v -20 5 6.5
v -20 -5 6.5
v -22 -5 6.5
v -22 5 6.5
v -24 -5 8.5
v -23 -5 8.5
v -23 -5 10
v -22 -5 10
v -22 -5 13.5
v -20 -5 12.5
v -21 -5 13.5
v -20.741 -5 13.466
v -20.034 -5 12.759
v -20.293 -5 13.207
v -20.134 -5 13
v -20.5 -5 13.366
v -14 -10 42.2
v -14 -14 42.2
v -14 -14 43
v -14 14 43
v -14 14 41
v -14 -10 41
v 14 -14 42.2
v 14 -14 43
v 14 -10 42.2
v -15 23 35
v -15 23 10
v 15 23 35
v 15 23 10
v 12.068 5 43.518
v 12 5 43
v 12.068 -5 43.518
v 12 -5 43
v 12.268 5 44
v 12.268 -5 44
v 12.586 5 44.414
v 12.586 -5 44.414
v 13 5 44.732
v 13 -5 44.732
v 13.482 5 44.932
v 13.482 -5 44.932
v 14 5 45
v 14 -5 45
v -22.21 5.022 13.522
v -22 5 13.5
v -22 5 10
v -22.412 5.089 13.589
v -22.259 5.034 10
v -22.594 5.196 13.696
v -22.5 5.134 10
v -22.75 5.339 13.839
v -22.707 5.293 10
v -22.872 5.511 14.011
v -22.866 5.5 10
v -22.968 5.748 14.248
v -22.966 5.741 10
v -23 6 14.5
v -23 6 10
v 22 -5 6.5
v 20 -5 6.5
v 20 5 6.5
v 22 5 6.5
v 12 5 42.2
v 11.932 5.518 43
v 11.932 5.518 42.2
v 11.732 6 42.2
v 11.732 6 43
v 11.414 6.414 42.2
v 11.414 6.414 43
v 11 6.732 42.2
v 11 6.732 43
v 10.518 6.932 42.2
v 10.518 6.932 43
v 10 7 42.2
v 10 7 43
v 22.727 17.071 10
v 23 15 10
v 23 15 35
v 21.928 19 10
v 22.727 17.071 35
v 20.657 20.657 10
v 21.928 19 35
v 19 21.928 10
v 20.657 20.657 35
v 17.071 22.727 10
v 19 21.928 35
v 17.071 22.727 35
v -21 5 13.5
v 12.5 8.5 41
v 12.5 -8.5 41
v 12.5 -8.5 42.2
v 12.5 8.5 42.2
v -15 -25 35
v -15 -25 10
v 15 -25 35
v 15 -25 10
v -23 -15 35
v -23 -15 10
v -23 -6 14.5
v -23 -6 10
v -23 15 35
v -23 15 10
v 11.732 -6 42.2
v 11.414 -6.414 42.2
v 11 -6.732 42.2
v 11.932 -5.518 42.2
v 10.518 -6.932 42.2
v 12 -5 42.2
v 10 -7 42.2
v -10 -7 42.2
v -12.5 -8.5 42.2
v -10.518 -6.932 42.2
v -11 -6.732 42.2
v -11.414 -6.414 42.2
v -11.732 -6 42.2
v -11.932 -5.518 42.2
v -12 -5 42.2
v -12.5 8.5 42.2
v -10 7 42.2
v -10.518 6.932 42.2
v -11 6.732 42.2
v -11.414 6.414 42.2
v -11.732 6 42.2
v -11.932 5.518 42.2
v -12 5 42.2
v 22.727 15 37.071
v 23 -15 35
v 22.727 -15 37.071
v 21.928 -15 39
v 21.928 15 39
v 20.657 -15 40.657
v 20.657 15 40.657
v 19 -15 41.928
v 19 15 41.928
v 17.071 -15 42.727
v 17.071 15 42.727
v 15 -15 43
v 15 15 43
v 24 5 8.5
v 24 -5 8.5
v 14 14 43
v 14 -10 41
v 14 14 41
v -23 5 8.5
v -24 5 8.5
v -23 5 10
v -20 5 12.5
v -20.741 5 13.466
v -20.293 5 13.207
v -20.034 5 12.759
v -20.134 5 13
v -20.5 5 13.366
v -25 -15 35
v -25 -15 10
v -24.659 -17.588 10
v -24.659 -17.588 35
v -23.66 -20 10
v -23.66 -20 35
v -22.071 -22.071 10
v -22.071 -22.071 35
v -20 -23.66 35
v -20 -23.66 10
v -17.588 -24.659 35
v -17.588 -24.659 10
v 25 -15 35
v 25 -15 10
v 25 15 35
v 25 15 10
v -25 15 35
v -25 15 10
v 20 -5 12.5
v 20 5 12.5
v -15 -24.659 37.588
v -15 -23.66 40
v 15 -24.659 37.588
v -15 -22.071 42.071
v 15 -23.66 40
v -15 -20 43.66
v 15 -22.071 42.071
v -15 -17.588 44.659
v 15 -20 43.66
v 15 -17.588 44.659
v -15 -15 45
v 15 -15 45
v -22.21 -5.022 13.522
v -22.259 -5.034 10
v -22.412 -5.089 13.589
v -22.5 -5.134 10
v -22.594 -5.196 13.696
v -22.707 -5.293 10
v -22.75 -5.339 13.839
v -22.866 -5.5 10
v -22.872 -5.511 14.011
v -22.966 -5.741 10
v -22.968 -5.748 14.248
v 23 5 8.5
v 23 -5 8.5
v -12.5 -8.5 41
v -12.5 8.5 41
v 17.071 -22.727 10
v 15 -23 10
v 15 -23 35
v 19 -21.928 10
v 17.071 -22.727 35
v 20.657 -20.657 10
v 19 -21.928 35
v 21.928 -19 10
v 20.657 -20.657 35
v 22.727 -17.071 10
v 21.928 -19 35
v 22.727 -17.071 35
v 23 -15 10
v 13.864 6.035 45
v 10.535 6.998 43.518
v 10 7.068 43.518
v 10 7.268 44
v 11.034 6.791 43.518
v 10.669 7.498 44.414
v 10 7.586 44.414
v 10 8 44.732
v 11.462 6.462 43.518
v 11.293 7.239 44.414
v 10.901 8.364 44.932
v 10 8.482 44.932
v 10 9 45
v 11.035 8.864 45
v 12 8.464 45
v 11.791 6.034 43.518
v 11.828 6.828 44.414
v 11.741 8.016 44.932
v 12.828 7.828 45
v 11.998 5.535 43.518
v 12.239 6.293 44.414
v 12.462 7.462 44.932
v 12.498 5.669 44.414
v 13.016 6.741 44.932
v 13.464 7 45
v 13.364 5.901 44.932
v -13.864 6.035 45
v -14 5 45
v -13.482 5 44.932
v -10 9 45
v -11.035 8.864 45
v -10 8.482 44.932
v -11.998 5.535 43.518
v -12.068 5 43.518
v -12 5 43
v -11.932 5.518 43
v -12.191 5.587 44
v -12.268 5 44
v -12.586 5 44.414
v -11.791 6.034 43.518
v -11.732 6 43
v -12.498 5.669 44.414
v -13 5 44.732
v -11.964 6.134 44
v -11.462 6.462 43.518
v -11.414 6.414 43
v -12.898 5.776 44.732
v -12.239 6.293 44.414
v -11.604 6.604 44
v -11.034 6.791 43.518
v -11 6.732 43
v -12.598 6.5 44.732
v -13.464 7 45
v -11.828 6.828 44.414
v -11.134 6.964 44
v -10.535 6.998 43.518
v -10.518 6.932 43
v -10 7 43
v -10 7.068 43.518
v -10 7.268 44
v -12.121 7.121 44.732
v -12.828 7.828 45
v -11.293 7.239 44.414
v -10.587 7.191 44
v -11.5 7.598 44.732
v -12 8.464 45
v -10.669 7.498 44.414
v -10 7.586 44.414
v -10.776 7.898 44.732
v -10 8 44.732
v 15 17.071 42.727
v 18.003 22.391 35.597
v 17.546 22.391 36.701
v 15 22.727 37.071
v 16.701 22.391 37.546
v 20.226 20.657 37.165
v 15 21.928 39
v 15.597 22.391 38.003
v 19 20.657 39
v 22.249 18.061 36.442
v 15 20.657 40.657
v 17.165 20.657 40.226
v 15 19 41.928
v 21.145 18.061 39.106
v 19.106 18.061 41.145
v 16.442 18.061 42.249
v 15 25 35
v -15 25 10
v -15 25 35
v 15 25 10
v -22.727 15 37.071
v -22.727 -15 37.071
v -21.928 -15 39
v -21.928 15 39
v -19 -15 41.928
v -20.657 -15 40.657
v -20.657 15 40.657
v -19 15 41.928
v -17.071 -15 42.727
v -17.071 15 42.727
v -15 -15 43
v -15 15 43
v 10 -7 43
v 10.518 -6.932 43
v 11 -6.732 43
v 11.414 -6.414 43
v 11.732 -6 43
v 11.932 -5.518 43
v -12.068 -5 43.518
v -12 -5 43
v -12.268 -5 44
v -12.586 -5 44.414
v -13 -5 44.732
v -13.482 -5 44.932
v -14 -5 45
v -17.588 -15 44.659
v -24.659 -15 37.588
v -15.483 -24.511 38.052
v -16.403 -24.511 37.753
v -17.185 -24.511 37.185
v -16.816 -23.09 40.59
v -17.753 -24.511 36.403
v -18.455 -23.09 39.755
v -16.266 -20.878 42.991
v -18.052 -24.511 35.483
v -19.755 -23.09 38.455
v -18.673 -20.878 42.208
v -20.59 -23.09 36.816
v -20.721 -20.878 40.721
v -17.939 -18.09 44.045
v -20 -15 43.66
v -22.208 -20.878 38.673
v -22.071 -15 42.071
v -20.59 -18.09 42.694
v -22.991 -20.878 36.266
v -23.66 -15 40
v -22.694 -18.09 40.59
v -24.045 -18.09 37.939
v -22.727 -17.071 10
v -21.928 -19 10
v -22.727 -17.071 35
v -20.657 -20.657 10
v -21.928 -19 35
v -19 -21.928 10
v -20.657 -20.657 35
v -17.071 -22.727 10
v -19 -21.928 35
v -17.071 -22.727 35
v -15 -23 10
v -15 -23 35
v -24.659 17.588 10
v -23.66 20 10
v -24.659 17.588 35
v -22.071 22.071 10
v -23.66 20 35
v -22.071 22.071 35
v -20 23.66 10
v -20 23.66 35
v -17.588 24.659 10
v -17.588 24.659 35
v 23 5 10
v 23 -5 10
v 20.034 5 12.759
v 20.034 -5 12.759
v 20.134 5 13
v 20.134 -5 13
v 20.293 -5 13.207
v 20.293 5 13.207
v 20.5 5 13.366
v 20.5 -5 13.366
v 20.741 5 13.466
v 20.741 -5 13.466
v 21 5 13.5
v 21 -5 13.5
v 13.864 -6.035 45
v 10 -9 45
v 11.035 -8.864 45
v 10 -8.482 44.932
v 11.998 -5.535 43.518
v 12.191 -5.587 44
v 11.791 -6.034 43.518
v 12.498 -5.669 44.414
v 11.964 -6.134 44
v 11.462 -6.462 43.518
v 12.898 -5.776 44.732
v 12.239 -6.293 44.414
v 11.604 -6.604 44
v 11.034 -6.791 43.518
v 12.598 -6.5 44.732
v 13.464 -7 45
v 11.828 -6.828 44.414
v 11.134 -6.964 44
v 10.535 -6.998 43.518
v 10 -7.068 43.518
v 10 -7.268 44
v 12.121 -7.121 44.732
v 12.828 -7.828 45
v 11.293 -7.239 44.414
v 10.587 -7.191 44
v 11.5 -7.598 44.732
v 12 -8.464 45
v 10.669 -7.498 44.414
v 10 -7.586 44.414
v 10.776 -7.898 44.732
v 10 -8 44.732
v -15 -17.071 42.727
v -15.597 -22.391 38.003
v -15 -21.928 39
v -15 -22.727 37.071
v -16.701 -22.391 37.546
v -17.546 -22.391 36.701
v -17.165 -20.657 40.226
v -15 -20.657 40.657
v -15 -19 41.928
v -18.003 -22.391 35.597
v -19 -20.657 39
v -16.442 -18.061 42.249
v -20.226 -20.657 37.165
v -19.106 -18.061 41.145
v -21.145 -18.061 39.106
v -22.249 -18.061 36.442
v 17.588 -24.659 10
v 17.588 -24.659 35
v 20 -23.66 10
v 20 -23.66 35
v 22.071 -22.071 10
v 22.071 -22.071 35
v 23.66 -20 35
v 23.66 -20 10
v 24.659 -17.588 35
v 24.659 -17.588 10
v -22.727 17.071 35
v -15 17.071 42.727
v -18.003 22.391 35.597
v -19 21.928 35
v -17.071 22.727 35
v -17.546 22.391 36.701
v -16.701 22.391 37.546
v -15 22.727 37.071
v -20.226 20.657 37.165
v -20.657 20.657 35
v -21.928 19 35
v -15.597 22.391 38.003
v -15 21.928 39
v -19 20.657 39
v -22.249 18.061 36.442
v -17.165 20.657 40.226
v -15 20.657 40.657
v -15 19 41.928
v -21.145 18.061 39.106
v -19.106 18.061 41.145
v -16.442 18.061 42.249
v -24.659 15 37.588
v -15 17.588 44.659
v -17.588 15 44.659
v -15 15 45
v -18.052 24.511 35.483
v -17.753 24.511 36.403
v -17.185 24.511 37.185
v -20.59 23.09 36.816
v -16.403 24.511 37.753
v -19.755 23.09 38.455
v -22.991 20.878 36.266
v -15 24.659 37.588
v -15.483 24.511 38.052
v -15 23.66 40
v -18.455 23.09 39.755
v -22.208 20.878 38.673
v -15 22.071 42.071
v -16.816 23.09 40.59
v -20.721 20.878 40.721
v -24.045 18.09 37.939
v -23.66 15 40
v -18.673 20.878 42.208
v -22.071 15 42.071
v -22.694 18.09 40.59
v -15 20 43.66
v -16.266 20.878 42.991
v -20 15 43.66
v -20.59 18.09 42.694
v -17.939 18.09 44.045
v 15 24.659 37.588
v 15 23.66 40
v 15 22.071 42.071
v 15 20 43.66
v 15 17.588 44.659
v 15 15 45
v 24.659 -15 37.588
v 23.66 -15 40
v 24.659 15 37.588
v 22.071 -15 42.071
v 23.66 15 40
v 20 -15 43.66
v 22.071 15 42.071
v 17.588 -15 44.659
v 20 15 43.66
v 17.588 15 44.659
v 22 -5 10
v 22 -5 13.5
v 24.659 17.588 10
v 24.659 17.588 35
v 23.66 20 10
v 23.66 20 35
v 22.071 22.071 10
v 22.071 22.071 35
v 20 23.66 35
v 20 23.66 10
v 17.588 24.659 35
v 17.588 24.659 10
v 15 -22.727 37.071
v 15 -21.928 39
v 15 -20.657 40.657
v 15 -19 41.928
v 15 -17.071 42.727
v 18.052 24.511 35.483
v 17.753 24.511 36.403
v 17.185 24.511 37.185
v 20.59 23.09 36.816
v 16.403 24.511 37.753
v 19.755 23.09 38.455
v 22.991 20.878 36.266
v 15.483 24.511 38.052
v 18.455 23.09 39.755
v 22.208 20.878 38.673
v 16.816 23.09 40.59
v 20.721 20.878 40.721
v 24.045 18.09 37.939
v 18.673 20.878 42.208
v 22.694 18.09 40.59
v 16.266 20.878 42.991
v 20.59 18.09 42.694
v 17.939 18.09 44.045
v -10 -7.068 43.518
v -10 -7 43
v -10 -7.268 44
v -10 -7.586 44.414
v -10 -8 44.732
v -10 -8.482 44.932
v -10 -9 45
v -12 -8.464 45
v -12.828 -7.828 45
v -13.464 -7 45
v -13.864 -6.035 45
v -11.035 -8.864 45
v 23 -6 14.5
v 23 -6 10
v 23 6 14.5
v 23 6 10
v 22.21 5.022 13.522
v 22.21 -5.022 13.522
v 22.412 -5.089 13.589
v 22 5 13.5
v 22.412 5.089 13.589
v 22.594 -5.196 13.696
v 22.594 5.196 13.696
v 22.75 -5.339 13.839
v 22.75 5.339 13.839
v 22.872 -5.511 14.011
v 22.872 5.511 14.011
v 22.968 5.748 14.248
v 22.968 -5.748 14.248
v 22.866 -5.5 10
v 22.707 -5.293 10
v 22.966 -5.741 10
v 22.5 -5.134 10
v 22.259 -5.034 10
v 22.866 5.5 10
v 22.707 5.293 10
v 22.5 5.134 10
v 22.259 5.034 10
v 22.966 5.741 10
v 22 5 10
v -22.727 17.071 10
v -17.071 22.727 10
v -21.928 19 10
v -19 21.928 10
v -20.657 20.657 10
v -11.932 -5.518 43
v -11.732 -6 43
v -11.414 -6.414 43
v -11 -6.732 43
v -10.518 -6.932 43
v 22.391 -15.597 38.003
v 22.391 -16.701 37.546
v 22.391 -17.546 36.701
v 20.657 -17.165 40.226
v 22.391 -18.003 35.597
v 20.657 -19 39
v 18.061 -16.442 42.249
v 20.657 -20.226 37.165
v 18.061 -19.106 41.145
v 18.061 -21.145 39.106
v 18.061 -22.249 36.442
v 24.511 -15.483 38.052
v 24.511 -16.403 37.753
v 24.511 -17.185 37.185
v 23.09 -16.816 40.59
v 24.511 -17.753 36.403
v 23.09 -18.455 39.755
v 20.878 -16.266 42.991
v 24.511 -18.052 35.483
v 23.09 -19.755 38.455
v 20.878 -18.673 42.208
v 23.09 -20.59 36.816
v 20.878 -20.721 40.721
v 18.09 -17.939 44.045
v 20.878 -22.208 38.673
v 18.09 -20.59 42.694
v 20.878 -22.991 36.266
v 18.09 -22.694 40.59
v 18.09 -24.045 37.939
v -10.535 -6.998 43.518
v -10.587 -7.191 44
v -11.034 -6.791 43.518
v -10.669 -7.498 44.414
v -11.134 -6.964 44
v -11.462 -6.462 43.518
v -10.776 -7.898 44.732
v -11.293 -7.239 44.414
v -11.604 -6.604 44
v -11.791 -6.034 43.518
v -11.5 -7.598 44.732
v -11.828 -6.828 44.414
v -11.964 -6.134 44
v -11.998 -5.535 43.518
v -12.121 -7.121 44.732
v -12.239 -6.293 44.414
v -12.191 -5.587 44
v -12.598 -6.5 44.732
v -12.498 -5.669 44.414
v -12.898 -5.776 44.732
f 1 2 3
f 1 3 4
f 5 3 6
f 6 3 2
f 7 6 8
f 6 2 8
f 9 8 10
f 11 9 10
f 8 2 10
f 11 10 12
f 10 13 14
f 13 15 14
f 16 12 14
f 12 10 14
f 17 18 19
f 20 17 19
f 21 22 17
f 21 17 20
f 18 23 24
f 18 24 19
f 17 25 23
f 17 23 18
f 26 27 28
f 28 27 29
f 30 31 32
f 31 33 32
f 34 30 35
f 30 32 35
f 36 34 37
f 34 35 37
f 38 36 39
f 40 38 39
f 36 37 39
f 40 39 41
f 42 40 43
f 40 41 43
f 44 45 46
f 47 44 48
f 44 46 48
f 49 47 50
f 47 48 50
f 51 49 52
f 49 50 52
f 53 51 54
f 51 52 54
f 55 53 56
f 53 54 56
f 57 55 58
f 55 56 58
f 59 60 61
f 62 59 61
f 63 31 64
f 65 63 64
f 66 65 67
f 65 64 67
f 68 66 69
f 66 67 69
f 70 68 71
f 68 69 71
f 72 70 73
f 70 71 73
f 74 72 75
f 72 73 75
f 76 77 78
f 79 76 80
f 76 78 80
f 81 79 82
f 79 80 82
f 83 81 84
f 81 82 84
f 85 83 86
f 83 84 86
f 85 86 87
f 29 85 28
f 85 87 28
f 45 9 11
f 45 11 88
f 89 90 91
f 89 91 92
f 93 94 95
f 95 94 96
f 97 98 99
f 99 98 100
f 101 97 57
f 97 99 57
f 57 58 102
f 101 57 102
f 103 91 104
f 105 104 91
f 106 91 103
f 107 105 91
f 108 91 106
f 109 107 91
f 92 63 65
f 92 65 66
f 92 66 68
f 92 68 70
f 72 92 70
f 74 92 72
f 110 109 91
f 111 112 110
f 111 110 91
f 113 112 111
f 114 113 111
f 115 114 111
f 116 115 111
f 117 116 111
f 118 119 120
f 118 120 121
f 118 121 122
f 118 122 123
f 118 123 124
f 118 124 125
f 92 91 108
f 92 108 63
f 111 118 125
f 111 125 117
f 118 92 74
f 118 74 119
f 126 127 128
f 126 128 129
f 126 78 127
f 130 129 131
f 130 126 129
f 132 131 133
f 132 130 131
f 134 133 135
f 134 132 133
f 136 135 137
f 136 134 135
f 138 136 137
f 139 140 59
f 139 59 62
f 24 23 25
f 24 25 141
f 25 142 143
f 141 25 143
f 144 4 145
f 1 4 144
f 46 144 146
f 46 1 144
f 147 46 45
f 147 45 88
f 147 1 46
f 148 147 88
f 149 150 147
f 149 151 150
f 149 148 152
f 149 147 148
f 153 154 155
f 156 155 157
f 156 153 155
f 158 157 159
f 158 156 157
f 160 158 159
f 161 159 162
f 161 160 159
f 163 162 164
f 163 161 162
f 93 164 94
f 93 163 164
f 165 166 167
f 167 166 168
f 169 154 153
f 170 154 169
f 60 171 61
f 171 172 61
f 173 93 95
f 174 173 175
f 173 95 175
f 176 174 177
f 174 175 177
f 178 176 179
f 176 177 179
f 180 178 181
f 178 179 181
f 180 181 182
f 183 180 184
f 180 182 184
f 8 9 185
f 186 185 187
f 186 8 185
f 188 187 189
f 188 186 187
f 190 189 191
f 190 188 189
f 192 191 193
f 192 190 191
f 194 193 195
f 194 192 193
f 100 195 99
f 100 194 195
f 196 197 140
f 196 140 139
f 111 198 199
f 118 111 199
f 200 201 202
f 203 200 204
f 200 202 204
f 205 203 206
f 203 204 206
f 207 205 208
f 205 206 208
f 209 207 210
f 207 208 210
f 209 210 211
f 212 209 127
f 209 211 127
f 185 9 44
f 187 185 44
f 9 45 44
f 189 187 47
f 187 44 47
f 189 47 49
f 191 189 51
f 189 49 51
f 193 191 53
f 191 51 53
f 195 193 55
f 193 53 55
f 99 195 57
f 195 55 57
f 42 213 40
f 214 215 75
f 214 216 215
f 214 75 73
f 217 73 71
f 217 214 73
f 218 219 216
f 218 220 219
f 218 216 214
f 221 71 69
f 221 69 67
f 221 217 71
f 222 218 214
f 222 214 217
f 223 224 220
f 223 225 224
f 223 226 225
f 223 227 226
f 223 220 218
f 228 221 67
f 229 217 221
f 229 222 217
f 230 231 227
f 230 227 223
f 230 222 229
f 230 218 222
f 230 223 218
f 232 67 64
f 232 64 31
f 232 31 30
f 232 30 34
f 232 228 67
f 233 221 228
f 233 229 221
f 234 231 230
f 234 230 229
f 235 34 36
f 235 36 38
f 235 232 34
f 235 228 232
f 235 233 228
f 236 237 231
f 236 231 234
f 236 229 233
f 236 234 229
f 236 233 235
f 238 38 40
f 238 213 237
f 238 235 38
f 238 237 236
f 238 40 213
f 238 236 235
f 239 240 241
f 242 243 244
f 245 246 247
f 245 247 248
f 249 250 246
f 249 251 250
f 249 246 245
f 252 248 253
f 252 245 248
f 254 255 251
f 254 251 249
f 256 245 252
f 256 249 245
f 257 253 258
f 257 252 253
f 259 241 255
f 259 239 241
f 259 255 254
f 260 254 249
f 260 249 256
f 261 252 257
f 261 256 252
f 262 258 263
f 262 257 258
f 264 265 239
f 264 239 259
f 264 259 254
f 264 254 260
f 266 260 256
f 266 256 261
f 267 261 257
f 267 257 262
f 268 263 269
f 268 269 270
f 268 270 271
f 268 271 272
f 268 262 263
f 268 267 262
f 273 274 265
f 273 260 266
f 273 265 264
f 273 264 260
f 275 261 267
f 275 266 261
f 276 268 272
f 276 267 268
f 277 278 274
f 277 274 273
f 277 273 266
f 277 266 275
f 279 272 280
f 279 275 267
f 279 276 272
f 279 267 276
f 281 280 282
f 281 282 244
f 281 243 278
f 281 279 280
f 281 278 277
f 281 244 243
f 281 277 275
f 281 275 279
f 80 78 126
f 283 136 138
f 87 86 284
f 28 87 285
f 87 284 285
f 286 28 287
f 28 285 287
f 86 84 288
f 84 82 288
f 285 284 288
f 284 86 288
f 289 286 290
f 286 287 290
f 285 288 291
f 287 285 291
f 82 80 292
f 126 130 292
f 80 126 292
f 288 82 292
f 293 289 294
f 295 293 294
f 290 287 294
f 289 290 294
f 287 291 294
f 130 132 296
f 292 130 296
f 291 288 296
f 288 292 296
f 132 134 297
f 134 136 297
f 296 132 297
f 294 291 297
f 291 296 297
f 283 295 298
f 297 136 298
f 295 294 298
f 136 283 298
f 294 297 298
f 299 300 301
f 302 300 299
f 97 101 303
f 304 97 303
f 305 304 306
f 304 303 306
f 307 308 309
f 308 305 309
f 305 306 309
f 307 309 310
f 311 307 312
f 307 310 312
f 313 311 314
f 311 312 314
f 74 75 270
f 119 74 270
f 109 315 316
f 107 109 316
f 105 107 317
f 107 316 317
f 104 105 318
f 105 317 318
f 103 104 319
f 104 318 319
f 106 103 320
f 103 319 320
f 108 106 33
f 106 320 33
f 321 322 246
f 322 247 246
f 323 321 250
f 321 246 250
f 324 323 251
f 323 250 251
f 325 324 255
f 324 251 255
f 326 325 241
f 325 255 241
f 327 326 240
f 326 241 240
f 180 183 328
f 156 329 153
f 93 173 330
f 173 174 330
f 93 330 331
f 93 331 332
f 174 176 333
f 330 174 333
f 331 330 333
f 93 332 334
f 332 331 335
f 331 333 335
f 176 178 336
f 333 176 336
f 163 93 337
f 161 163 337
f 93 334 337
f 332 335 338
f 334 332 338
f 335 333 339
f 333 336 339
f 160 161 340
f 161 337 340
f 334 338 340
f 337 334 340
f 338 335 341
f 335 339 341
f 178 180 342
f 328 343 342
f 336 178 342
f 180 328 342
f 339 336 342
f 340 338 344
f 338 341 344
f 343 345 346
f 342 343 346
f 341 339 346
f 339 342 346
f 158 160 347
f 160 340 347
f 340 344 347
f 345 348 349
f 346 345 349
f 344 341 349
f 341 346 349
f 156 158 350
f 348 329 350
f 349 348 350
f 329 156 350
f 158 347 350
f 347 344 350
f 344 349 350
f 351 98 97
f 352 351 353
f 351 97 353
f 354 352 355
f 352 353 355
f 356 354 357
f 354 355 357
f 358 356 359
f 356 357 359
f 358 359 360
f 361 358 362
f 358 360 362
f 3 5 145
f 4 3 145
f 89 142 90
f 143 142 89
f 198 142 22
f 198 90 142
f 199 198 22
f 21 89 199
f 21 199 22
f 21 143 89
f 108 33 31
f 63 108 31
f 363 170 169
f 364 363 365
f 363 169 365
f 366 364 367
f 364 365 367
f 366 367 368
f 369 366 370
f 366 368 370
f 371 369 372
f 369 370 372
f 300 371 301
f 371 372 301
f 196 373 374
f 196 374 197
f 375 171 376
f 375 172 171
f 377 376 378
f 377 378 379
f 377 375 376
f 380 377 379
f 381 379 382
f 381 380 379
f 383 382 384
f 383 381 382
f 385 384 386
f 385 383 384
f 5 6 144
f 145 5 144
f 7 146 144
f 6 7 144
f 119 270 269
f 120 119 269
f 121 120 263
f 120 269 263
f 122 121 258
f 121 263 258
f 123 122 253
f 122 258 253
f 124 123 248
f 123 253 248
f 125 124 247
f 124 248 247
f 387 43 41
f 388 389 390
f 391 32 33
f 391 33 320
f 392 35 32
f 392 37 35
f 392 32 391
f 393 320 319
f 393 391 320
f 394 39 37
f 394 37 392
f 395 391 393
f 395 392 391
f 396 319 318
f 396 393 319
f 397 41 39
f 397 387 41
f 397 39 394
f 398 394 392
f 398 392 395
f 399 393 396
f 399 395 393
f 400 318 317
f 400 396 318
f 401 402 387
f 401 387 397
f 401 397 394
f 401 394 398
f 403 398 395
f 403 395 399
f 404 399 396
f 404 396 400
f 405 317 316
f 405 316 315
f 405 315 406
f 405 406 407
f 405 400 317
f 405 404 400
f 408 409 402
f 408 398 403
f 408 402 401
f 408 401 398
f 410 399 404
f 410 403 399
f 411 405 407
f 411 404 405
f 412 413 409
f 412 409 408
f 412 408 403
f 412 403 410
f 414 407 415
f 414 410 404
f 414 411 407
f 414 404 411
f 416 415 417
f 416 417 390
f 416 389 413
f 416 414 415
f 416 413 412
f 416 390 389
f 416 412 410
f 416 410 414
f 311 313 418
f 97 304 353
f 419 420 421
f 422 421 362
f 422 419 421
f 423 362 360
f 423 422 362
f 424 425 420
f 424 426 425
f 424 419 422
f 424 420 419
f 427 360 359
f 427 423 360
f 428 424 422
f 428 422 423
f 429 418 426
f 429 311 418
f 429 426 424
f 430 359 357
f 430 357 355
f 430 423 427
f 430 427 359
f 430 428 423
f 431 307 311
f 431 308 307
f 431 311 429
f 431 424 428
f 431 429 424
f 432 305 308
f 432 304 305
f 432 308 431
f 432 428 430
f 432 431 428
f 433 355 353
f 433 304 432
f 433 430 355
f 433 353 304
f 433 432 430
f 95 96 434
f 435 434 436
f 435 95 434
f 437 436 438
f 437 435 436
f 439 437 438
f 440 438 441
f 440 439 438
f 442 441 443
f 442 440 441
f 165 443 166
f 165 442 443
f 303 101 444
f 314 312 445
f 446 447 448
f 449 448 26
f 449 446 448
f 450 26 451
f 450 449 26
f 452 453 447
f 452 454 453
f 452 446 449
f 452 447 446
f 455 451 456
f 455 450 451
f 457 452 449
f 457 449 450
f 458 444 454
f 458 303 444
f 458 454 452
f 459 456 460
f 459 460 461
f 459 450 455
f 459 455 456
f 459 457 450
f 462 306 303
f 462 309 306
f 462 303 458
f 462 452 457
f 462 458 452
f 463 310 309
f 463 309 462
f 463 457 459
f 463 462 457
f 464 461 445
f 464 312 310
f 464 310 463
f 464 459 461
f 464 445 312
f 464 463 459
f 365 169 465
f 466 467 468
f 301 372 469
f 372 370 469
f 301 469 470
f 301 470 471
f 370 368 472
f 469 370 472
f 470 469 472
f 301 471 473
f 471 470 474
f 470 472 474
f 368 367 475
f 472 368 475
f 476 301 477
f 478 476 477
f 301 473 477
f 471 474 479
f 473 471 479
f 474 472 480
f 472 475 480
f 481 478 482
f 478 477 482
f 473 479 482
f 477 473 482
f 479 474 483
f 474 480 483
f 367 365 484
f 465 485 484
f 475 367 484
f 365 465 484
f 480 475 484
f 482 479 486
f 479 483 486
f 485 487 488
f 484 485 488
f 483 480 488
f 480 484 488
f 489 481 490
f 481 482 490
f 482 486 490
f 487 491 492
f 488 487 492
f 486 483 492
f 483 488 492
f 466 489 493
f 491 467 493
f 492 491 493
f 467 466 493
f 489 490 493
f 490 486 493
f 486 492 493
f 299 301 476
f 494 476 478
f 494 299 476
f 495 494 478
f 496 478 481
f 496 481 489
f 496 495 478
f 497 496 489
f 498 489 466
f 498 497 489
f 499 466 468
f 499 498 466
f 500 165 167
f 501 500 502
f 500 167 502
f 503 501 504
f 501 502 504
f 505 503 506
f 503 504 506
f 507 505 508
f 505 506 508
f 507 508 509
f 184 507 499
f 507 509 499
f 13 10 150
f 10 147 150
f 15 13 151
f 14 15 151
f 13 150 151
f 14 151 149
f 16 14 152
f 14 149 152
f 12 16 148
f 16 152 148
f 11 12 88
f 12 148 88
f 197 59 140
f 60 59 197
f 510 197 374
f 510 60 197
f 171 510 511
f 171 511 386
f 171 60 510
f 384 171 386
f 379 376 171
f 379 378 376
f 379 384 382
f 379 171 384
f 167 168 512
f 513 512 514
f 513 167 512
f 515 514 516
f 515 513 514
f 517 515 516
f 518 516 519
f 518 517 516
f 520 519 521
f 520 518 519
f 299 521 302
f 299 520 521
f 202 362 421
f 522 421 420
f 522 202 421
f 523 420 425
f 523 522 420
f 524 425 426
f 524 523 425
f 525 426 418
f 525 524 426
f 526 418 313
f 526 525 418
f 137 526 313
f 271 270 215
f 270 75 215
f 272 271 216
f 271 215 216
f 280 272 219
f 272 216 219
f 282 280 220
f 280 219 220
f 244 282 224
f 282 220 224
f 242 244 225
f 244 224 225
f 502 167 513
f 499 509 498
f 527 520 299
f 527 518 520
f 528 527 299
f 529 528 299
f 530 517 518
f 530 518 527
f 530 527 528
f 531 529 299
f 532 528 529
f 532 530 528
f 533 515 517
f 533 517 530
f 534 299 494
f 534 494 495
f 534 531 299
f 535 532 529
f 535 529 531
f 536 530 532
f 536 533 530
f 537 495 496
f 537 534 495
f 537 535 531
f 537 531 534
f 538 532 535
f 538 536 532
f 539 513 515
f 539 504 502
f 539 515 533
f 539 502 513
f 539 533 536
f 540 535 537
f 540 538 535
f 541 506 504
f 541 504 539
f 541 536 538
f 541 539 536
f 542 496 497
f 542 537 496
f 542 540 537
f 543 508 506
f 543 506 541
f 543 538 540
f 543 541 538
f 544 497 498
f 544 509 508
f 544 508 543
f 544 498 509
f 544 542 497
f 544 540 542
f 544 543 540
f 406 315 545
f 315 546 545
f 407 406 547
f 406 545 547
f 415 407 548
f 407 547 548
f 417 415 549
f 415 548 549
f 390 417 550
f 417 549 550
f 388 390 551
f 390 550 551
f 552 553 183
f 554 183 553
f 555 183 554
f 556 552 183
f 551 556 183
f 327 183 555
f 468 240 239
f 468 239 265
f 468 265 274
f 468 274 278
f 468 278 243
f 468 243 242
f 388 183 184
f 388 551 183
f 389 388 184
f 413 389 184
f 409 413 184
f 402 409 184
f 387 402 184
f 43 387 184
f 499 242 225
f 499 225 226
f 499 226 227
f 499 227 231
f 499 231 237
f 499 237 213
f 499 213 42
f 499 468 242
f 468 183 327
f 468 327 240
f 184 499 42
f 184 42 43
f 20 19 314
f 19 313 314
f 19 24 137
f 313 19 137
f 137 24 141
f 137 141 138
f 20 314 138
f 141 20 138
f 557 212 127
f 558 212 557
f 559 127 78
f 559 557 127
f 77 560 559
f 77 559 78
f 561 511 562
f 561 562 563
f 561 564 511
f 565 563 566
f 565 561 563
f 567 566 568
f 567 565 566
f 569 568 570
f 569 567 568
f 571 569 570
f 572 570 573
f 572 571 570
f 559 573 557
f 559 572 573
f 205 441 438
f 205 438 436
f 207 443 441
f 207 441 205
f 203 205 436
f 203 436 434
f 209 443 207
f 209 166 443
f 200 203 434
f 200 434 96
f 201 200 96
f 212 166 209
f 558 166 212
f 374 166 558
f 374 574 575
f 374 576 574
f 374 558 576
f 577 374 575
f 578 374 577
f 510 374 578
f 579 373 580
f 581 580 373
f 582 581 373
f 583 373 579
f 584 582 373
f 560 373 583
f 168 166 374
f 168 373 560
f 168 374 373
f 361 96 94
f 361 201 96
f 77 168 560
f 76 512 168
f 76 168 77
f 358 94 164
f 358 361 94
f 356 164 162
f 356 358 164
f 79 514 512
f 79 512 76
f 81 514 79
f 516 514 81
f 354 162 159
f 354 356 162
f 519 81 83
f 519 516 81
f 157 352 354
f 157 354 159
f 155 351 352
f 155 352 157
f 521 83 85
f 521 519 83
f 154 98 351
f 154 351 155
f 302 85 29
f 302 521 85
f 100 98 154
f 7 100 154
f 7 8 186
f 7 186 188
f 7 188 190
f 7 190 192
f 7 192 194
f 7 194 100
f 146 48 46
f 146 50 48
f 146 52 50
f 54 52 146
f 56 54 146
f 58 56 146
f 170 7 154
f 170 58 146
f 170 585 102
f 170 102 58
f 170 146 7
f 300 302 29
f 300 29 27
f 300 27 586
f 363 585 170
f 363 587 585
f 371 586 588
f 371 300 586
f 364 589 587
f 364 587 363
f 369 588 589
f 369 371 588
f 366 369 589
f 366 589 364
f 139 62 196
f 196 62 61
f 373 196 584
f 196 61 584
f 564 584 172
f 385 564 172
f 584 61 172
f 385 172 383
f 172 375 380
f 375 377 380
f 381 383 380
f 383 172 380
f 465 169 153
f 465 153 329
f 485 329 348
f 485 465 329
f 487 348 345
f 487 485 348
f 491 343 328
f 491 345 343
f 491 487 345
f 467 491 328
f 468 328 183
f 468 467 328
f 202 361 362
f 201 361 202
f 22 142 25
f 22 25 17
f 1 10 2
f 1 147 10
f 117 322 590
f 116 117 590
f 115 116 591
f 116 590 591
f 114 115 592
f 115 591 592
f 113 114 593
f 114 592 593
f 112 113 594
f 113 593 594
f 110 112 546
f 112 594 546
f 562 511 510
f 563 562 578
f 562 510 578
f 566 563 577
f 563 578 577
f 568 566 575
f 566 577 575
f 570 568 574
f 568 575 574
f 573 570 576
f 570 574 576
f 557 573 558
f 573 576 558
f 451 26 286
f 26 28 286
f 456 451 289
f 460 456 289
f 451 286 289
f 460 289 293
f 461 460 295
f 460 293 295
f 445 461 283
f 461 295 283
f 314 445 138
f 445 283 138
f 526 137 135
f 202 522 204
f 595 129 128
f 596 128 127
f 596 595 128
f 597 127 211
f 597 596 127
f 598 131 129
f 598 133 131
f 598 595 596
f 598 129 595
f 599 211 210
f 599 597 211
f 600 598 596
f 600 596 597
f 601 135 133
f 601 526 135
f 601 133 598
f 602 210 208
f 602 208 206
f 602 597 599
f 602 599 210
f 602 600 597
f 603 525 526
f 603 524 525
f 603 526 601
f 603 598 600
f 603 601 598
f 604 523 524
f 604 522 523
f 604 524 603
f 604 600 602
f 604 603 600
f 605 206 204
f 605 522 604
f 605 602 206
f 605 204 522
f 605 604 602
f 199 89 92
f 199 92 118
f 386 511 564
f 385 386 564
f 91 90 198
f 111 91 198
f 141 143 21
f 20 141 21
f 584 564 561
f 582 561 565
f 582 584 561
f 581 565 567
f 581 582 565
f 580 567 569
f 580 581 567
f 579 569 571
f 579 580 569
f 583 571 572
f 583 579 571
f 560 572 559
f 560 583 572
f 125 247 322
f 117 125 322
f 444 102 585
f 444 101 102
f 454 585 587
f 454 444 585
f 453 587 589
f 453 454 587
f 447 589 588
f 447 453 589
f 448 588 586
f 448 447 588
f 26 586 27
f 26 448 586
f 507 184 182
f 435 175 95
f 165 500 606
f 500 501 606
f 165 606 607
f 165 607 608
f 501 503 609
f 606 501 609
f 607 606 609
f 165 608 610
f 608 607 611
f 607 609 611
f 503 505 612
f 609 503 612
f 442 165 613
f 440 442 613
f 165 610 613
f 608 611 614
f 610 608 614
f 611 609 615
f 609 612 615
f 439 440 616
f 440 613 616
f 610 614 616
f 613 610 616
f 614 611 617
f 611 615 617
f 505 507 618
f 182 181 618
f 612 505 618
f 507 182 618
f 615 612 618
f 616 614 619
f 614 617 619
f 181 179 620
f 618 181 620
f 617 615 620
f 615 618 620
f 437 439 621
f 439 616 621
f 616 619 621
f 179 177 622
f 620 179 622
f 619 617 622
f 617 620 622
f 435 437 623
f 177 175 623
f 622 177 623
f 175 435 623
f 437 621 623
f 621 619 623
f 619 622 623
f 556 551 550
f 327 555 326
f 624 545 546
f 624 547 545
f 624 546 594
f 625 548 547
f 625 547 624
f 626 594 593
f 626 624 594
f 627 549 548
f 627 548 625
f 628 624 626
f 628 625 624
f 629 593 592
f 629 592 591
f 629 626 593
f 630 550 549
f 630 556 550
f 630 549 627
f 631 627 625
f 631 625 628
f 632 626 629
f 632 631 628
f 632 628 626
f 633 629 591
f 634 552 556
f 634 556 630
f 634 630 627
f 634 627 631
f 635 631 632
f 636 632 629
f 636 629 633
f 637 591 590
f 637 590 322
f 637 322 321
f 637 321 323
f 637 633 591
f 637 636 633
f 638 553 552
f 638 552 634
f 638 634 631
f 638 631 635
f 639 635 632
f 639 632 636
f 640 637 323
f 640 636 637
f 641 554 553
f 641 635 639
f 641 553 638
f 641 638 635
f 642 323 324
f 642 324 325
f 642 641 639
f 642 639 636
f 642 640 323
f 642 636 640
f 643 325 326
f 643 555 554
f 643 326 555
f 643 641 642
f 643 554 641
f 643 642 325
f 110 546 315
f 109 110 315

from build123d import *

# Parameters (mm, degrees)
SKETCH1_W                = 50
SKETCH1_H                = 50
BOSS_EXTRUDE1_DEPTH      = 45
FILLET1_R                = 10
SHELL1_T                 = -2
SKETCH2_W                = 24
SKETCH2_H                = 14
CUT_EXTRUDE1_DEPTH       = 10
SKETCH3_W                = 28
SKETCH3_H                = 18
BOSS_EXTRUDE2_DEPTH      = 2
SKETCH4_W                = 24
SKETCH4_H                = 14
CUT_EXTRUDE2_DEPTH       = 2
FILLET2_R                = 2
FILLET3_R                = 2
SKETCH5_W                = 28
SKETCH5_H                = 28
BOSS_EXTRUDE3_DEPTH      = 2
CUT_EXTRUDE4_DEPTH       = 2
SKETCH8_W                = 25
SKETCH8_H                = 17
CUT_EXTRUDE5_DEPTH       = 1.2
SKETCH9_W                = 28
SKETCH9_H                = 4
CUT_EXTRUDE6_DEPTH       = 1.2
CUT_EXTRUDE10_START      = -10
CUT_EXTRUDE10_DEPTH      = 10
SKETCH14_W               = 7
SKETCH14_H               = 10
BOSS_EXTRUDE4_DEPTH      = 3
SKETCH15_W               = 2
SKETCH15_H               = 10
BOSS_EXTRUDE5_DEPTH      = 1
CHAMFER1_SIZE            = 2
FILLET4_R                = 1
CHAMFER1_OF_MIRROR1_SIZE = 2
FILLET5_R                = 1


with BuildPart() as part:
    # Sketch1 → Boss-Extrude1 (new body)
    with BuildSketch(Plane.XY):
        Rectangle(SKETCH1_W, SKETCH1_H)
    extrude(amount=BOSS_EXTRUDE1_DEPTH)

    # Fillet1
    fillet1_edges = [part.edges().sort_by_distance(p)[0] for p in [
        (-25, 0, 45),
        (0, -25, 45),
        (25, 0, 45),
        (25, -25, 22.5),
        (-25, -25, 22.5),
        (-25, 25, 22.5),
        (25, 25, 22.5),
        (0, 25, 45),
    ]]
    fillet(fillet1_edges, radius=FILLET1_R)

    # Shell1
    shell1_openings = [part.faces().sort_by_distance(p)[0] for p in [
        (0, 0, 0),
    ]]
    offset(amount=SHELL1_T, openings=shell1_openings, kind=Kind.INTERSECTION)

    # Sketch2 → Cut-Extrude1 (cut)
    with BuildSketch(Plane(origin=(0, 0, 43), x_dir=(-1, 0, 0), z_dir=(0, 0, -1))):
        Rectangle(SKETCH2_W, SKETCH2_H)
    extrude(amount=-CUT_EXTRUDE1_DEPTH, mode=Mode.SUBTRACT)

    # Sketch3 → Boss-Extrude2 (add)
    with BuildSketch(Plane(origin=(0, 0, 43), x_dir=(-1, 0, 0), z_dir=(0, 0, -1))):
        Rectangle(SKETCH3_W, SKETCH3_H)
    extrude(amount=BOSS_EXTRUDE2_DEPTH)

    # Sketch4 → Cut-Extrude2 (cut)
    with BuildSketch(Plane.XY.offset(43)):
        Rectangle(SKETCH4_W, SKETCH4_H)
    extrude(amount=-CUT_EXTRUDE2_DEPTH, mode=Mode.SUBTRACT)

    # Fillet2
    fillet2_edges = [part.edges().sort_by_distance(p)[0] for p in [
        (-12, 7, 43),
        (-12, -7, 43),
        (12, -7, 43),
        (12, 7, 43),
    ]]
    fillet(fillet2_edges, radius=FILLET2_R)

    # Fillet3
    fillet3_edges = [part.edges().sort_by_distance(p)[0] for p in [
        (12, 0, 45),
        (0, 7, 45),
        (0, -7, 45),
        (-12, 0, 45),
        (11.414213562, 6.414213562, 45),
        (11.414213562, -6.414213562, 45),
        (-11.414213562, -6.414213562, 45),
        (-11.414213562, 6.414213562, 45),
    ]]
    fillet(fillet3_edges, radius=FILLET3_R)

    # Sketch5 → Boss-Extrude3 (add)
    with BuildSketch(Plane(origin=(0, 0, 41), x_dir=(-1, 0, 0), z_dir=(0, 0, -1))):
        Rectangle(SKETCH5_W, SKETCH5_H)
    extrude(amount=-BOSS_EXTRUDE3_DEPTH)

    # Sketch7 → Cut-Extrude4 (cut)
    with BuildSketch(Plane.XY.offset(43)):
        with BuildLine():
            Line((12, -5), (12, 5))
            ThreePointArc((12, 5), (11.414213562, 6.414213562), (10, 7))
            Line((10, 7), (-10, 7))
            ThreePointArc((-10, 7), (-11.414213562, 6.414213562), (-12, 5))
            Line((-12, 5), (-12, -5))
            ThreePointArc((-12, -5), (-11.414213562, -6.414213562), (-10, -7))
            Line((-10, -7), (10, -7))
            ThreePointArc((10, -7), (11.414213562, -6.414213562), (12, -5))
        make_face()
    extrude(amount=-CUT_EXTRUDE4_DEPTH, mode=Mode.SUBTRACT)

    # Sketch8 → Cut-Extrude5 (cut)
    with BuildSketch(Plane(origin=(0, 0, 41), x_dir=(-1, 0, 0), z_dir=(0, 0, -1))):
        Rectangle(SKETCH8_W, SKETCH8_H)
    extrude(amount=-CUT_EXTRUDE5_DEPTH, mode=Mode.SUBTRACT)

    # Sketch9 → Cut-Extrude6 (cut)
    with BuildSketch(Plane(origin=(0, 0, 41), x_dir=(-1, 0, 0), z_dir=(0, 0, -1))):
        with Locations((0, -12)):
            Rectangle(SKETCH9_W, SKETCH9_H)
    extrude(amount=-CUT_EXTRUDE6_DEPTH, mode=Mode.SUBTRACT)

    # Sketch13 → Cut-Extrude10 (cut)
    with BuildSketch(Plane(origin=(0, 0, 0), x_dir=(-1, 0, 0), z_dir=(0, 0, -1)).offset(CUT_EXTRUDE10_START)):
        with BuildLine():
            Line((-15, -25), (15, -25))
            ThreePointArc((15, -25), (22.071067812, -22.071067812), (25, -15))
            Line((25, -15), (25, 15))
            ThreePointArc((25, 15), (22.071067812, 22.071067812), (15, 25))
            Line((15, 25), (-15, 25))
            ThreePointArc((-15, 25), (-22.071067812, 22.071067812), (-25, 15))
            Line((-25, 15), (-25, -15))
            ThreePointArc((-25, -15), (-22.071067812, -22.071067812), (-15, -25))
        make_face()
    extrude(amount=CUT_EXTRUDE10_DEPTH, mode=Mode.SUBTRACT)

    # Sketch14 → Boss-Extrude4 (add)
    with BuildSketch(Plane(origin=(-23, 0, 0), x_dir=(0, 0, -1), z_dir=(1, 0, 0))):
        with Locations((-10, 0)):
            Rectangle(SKETCH14_W, SKETCH14_H)
    boss_extrude4 = extrude(amount=BOSS_EXTRUDE4_DEPTH)

    # Sketch15 → Boss-Extrude5 (add)
    with BuildSketch(Plane.ZY.offset(23)):
        with Locations((7.5, 0)):
            Rectangle(SKETCH15_W, SKETCH15_H)
    boss_extrude5 = extrude(amount=BOSS_EXTRUDE5_DEPTH)

    # Chamfer1
    chamfer1_edges = [part.edges().sort_by_distance(p)[0] for p in [
        (-24, 0, 6.5),
    ]]
    chamfer(chamfer1_edges, length=CHAMFER1_SIZE - 0.0001)  # a hair under: the kernel refuses the full size

    # Fillet4
    fillet4_edges = [part.edges().sort_by_distance(p)[0] for p in [
        (-23, 5, 11.75),
        (-23, 0, 13.5),
        (-23, -5, 11.75),
        (-20, 0, 13.5),
    ]]
    fillet(fillet4_edges, radius=FILLET4_R)

    # Mirror1: Boss-Extrude4, Boss-Extrude5 across plane
    add(boss_extrude4.mirror(Plane(origin=(0, 0, 0), x_dir=(0, 0, 1), z_dir=(1, 0, 0))))
    add(boss_extrude5.mirror(Plane(origin=(0, 0, 0), x_dir=(0, 0, 1), z_dir=(1, 0, 0))))

    # Chamfer1 of Mirror1
    chamfer1_of_mirror1_edges = [part.edges().sort_by_distance(p)[0] for p in [
        (24, 0, 6.5),
    ]]
    chamfer(chamfer1_of_mirror1_edges, length=CHAMFER1_OF_MIRROR1_SIZE - 0.0001)  # a hair under: the kernel refuses the full size

    # Fillet5
    fillet5_edges = [part.edges().sort_by_distance(p)[0] for p in [
        (23, 5, 11.75),
        (23, 0, 13.5),
        (23, -5, 11.75),
        (20, 0, 13.5),
    ]]
    fillet(fillet5_edges, radius=FILLET5_R)


solid = part.part
